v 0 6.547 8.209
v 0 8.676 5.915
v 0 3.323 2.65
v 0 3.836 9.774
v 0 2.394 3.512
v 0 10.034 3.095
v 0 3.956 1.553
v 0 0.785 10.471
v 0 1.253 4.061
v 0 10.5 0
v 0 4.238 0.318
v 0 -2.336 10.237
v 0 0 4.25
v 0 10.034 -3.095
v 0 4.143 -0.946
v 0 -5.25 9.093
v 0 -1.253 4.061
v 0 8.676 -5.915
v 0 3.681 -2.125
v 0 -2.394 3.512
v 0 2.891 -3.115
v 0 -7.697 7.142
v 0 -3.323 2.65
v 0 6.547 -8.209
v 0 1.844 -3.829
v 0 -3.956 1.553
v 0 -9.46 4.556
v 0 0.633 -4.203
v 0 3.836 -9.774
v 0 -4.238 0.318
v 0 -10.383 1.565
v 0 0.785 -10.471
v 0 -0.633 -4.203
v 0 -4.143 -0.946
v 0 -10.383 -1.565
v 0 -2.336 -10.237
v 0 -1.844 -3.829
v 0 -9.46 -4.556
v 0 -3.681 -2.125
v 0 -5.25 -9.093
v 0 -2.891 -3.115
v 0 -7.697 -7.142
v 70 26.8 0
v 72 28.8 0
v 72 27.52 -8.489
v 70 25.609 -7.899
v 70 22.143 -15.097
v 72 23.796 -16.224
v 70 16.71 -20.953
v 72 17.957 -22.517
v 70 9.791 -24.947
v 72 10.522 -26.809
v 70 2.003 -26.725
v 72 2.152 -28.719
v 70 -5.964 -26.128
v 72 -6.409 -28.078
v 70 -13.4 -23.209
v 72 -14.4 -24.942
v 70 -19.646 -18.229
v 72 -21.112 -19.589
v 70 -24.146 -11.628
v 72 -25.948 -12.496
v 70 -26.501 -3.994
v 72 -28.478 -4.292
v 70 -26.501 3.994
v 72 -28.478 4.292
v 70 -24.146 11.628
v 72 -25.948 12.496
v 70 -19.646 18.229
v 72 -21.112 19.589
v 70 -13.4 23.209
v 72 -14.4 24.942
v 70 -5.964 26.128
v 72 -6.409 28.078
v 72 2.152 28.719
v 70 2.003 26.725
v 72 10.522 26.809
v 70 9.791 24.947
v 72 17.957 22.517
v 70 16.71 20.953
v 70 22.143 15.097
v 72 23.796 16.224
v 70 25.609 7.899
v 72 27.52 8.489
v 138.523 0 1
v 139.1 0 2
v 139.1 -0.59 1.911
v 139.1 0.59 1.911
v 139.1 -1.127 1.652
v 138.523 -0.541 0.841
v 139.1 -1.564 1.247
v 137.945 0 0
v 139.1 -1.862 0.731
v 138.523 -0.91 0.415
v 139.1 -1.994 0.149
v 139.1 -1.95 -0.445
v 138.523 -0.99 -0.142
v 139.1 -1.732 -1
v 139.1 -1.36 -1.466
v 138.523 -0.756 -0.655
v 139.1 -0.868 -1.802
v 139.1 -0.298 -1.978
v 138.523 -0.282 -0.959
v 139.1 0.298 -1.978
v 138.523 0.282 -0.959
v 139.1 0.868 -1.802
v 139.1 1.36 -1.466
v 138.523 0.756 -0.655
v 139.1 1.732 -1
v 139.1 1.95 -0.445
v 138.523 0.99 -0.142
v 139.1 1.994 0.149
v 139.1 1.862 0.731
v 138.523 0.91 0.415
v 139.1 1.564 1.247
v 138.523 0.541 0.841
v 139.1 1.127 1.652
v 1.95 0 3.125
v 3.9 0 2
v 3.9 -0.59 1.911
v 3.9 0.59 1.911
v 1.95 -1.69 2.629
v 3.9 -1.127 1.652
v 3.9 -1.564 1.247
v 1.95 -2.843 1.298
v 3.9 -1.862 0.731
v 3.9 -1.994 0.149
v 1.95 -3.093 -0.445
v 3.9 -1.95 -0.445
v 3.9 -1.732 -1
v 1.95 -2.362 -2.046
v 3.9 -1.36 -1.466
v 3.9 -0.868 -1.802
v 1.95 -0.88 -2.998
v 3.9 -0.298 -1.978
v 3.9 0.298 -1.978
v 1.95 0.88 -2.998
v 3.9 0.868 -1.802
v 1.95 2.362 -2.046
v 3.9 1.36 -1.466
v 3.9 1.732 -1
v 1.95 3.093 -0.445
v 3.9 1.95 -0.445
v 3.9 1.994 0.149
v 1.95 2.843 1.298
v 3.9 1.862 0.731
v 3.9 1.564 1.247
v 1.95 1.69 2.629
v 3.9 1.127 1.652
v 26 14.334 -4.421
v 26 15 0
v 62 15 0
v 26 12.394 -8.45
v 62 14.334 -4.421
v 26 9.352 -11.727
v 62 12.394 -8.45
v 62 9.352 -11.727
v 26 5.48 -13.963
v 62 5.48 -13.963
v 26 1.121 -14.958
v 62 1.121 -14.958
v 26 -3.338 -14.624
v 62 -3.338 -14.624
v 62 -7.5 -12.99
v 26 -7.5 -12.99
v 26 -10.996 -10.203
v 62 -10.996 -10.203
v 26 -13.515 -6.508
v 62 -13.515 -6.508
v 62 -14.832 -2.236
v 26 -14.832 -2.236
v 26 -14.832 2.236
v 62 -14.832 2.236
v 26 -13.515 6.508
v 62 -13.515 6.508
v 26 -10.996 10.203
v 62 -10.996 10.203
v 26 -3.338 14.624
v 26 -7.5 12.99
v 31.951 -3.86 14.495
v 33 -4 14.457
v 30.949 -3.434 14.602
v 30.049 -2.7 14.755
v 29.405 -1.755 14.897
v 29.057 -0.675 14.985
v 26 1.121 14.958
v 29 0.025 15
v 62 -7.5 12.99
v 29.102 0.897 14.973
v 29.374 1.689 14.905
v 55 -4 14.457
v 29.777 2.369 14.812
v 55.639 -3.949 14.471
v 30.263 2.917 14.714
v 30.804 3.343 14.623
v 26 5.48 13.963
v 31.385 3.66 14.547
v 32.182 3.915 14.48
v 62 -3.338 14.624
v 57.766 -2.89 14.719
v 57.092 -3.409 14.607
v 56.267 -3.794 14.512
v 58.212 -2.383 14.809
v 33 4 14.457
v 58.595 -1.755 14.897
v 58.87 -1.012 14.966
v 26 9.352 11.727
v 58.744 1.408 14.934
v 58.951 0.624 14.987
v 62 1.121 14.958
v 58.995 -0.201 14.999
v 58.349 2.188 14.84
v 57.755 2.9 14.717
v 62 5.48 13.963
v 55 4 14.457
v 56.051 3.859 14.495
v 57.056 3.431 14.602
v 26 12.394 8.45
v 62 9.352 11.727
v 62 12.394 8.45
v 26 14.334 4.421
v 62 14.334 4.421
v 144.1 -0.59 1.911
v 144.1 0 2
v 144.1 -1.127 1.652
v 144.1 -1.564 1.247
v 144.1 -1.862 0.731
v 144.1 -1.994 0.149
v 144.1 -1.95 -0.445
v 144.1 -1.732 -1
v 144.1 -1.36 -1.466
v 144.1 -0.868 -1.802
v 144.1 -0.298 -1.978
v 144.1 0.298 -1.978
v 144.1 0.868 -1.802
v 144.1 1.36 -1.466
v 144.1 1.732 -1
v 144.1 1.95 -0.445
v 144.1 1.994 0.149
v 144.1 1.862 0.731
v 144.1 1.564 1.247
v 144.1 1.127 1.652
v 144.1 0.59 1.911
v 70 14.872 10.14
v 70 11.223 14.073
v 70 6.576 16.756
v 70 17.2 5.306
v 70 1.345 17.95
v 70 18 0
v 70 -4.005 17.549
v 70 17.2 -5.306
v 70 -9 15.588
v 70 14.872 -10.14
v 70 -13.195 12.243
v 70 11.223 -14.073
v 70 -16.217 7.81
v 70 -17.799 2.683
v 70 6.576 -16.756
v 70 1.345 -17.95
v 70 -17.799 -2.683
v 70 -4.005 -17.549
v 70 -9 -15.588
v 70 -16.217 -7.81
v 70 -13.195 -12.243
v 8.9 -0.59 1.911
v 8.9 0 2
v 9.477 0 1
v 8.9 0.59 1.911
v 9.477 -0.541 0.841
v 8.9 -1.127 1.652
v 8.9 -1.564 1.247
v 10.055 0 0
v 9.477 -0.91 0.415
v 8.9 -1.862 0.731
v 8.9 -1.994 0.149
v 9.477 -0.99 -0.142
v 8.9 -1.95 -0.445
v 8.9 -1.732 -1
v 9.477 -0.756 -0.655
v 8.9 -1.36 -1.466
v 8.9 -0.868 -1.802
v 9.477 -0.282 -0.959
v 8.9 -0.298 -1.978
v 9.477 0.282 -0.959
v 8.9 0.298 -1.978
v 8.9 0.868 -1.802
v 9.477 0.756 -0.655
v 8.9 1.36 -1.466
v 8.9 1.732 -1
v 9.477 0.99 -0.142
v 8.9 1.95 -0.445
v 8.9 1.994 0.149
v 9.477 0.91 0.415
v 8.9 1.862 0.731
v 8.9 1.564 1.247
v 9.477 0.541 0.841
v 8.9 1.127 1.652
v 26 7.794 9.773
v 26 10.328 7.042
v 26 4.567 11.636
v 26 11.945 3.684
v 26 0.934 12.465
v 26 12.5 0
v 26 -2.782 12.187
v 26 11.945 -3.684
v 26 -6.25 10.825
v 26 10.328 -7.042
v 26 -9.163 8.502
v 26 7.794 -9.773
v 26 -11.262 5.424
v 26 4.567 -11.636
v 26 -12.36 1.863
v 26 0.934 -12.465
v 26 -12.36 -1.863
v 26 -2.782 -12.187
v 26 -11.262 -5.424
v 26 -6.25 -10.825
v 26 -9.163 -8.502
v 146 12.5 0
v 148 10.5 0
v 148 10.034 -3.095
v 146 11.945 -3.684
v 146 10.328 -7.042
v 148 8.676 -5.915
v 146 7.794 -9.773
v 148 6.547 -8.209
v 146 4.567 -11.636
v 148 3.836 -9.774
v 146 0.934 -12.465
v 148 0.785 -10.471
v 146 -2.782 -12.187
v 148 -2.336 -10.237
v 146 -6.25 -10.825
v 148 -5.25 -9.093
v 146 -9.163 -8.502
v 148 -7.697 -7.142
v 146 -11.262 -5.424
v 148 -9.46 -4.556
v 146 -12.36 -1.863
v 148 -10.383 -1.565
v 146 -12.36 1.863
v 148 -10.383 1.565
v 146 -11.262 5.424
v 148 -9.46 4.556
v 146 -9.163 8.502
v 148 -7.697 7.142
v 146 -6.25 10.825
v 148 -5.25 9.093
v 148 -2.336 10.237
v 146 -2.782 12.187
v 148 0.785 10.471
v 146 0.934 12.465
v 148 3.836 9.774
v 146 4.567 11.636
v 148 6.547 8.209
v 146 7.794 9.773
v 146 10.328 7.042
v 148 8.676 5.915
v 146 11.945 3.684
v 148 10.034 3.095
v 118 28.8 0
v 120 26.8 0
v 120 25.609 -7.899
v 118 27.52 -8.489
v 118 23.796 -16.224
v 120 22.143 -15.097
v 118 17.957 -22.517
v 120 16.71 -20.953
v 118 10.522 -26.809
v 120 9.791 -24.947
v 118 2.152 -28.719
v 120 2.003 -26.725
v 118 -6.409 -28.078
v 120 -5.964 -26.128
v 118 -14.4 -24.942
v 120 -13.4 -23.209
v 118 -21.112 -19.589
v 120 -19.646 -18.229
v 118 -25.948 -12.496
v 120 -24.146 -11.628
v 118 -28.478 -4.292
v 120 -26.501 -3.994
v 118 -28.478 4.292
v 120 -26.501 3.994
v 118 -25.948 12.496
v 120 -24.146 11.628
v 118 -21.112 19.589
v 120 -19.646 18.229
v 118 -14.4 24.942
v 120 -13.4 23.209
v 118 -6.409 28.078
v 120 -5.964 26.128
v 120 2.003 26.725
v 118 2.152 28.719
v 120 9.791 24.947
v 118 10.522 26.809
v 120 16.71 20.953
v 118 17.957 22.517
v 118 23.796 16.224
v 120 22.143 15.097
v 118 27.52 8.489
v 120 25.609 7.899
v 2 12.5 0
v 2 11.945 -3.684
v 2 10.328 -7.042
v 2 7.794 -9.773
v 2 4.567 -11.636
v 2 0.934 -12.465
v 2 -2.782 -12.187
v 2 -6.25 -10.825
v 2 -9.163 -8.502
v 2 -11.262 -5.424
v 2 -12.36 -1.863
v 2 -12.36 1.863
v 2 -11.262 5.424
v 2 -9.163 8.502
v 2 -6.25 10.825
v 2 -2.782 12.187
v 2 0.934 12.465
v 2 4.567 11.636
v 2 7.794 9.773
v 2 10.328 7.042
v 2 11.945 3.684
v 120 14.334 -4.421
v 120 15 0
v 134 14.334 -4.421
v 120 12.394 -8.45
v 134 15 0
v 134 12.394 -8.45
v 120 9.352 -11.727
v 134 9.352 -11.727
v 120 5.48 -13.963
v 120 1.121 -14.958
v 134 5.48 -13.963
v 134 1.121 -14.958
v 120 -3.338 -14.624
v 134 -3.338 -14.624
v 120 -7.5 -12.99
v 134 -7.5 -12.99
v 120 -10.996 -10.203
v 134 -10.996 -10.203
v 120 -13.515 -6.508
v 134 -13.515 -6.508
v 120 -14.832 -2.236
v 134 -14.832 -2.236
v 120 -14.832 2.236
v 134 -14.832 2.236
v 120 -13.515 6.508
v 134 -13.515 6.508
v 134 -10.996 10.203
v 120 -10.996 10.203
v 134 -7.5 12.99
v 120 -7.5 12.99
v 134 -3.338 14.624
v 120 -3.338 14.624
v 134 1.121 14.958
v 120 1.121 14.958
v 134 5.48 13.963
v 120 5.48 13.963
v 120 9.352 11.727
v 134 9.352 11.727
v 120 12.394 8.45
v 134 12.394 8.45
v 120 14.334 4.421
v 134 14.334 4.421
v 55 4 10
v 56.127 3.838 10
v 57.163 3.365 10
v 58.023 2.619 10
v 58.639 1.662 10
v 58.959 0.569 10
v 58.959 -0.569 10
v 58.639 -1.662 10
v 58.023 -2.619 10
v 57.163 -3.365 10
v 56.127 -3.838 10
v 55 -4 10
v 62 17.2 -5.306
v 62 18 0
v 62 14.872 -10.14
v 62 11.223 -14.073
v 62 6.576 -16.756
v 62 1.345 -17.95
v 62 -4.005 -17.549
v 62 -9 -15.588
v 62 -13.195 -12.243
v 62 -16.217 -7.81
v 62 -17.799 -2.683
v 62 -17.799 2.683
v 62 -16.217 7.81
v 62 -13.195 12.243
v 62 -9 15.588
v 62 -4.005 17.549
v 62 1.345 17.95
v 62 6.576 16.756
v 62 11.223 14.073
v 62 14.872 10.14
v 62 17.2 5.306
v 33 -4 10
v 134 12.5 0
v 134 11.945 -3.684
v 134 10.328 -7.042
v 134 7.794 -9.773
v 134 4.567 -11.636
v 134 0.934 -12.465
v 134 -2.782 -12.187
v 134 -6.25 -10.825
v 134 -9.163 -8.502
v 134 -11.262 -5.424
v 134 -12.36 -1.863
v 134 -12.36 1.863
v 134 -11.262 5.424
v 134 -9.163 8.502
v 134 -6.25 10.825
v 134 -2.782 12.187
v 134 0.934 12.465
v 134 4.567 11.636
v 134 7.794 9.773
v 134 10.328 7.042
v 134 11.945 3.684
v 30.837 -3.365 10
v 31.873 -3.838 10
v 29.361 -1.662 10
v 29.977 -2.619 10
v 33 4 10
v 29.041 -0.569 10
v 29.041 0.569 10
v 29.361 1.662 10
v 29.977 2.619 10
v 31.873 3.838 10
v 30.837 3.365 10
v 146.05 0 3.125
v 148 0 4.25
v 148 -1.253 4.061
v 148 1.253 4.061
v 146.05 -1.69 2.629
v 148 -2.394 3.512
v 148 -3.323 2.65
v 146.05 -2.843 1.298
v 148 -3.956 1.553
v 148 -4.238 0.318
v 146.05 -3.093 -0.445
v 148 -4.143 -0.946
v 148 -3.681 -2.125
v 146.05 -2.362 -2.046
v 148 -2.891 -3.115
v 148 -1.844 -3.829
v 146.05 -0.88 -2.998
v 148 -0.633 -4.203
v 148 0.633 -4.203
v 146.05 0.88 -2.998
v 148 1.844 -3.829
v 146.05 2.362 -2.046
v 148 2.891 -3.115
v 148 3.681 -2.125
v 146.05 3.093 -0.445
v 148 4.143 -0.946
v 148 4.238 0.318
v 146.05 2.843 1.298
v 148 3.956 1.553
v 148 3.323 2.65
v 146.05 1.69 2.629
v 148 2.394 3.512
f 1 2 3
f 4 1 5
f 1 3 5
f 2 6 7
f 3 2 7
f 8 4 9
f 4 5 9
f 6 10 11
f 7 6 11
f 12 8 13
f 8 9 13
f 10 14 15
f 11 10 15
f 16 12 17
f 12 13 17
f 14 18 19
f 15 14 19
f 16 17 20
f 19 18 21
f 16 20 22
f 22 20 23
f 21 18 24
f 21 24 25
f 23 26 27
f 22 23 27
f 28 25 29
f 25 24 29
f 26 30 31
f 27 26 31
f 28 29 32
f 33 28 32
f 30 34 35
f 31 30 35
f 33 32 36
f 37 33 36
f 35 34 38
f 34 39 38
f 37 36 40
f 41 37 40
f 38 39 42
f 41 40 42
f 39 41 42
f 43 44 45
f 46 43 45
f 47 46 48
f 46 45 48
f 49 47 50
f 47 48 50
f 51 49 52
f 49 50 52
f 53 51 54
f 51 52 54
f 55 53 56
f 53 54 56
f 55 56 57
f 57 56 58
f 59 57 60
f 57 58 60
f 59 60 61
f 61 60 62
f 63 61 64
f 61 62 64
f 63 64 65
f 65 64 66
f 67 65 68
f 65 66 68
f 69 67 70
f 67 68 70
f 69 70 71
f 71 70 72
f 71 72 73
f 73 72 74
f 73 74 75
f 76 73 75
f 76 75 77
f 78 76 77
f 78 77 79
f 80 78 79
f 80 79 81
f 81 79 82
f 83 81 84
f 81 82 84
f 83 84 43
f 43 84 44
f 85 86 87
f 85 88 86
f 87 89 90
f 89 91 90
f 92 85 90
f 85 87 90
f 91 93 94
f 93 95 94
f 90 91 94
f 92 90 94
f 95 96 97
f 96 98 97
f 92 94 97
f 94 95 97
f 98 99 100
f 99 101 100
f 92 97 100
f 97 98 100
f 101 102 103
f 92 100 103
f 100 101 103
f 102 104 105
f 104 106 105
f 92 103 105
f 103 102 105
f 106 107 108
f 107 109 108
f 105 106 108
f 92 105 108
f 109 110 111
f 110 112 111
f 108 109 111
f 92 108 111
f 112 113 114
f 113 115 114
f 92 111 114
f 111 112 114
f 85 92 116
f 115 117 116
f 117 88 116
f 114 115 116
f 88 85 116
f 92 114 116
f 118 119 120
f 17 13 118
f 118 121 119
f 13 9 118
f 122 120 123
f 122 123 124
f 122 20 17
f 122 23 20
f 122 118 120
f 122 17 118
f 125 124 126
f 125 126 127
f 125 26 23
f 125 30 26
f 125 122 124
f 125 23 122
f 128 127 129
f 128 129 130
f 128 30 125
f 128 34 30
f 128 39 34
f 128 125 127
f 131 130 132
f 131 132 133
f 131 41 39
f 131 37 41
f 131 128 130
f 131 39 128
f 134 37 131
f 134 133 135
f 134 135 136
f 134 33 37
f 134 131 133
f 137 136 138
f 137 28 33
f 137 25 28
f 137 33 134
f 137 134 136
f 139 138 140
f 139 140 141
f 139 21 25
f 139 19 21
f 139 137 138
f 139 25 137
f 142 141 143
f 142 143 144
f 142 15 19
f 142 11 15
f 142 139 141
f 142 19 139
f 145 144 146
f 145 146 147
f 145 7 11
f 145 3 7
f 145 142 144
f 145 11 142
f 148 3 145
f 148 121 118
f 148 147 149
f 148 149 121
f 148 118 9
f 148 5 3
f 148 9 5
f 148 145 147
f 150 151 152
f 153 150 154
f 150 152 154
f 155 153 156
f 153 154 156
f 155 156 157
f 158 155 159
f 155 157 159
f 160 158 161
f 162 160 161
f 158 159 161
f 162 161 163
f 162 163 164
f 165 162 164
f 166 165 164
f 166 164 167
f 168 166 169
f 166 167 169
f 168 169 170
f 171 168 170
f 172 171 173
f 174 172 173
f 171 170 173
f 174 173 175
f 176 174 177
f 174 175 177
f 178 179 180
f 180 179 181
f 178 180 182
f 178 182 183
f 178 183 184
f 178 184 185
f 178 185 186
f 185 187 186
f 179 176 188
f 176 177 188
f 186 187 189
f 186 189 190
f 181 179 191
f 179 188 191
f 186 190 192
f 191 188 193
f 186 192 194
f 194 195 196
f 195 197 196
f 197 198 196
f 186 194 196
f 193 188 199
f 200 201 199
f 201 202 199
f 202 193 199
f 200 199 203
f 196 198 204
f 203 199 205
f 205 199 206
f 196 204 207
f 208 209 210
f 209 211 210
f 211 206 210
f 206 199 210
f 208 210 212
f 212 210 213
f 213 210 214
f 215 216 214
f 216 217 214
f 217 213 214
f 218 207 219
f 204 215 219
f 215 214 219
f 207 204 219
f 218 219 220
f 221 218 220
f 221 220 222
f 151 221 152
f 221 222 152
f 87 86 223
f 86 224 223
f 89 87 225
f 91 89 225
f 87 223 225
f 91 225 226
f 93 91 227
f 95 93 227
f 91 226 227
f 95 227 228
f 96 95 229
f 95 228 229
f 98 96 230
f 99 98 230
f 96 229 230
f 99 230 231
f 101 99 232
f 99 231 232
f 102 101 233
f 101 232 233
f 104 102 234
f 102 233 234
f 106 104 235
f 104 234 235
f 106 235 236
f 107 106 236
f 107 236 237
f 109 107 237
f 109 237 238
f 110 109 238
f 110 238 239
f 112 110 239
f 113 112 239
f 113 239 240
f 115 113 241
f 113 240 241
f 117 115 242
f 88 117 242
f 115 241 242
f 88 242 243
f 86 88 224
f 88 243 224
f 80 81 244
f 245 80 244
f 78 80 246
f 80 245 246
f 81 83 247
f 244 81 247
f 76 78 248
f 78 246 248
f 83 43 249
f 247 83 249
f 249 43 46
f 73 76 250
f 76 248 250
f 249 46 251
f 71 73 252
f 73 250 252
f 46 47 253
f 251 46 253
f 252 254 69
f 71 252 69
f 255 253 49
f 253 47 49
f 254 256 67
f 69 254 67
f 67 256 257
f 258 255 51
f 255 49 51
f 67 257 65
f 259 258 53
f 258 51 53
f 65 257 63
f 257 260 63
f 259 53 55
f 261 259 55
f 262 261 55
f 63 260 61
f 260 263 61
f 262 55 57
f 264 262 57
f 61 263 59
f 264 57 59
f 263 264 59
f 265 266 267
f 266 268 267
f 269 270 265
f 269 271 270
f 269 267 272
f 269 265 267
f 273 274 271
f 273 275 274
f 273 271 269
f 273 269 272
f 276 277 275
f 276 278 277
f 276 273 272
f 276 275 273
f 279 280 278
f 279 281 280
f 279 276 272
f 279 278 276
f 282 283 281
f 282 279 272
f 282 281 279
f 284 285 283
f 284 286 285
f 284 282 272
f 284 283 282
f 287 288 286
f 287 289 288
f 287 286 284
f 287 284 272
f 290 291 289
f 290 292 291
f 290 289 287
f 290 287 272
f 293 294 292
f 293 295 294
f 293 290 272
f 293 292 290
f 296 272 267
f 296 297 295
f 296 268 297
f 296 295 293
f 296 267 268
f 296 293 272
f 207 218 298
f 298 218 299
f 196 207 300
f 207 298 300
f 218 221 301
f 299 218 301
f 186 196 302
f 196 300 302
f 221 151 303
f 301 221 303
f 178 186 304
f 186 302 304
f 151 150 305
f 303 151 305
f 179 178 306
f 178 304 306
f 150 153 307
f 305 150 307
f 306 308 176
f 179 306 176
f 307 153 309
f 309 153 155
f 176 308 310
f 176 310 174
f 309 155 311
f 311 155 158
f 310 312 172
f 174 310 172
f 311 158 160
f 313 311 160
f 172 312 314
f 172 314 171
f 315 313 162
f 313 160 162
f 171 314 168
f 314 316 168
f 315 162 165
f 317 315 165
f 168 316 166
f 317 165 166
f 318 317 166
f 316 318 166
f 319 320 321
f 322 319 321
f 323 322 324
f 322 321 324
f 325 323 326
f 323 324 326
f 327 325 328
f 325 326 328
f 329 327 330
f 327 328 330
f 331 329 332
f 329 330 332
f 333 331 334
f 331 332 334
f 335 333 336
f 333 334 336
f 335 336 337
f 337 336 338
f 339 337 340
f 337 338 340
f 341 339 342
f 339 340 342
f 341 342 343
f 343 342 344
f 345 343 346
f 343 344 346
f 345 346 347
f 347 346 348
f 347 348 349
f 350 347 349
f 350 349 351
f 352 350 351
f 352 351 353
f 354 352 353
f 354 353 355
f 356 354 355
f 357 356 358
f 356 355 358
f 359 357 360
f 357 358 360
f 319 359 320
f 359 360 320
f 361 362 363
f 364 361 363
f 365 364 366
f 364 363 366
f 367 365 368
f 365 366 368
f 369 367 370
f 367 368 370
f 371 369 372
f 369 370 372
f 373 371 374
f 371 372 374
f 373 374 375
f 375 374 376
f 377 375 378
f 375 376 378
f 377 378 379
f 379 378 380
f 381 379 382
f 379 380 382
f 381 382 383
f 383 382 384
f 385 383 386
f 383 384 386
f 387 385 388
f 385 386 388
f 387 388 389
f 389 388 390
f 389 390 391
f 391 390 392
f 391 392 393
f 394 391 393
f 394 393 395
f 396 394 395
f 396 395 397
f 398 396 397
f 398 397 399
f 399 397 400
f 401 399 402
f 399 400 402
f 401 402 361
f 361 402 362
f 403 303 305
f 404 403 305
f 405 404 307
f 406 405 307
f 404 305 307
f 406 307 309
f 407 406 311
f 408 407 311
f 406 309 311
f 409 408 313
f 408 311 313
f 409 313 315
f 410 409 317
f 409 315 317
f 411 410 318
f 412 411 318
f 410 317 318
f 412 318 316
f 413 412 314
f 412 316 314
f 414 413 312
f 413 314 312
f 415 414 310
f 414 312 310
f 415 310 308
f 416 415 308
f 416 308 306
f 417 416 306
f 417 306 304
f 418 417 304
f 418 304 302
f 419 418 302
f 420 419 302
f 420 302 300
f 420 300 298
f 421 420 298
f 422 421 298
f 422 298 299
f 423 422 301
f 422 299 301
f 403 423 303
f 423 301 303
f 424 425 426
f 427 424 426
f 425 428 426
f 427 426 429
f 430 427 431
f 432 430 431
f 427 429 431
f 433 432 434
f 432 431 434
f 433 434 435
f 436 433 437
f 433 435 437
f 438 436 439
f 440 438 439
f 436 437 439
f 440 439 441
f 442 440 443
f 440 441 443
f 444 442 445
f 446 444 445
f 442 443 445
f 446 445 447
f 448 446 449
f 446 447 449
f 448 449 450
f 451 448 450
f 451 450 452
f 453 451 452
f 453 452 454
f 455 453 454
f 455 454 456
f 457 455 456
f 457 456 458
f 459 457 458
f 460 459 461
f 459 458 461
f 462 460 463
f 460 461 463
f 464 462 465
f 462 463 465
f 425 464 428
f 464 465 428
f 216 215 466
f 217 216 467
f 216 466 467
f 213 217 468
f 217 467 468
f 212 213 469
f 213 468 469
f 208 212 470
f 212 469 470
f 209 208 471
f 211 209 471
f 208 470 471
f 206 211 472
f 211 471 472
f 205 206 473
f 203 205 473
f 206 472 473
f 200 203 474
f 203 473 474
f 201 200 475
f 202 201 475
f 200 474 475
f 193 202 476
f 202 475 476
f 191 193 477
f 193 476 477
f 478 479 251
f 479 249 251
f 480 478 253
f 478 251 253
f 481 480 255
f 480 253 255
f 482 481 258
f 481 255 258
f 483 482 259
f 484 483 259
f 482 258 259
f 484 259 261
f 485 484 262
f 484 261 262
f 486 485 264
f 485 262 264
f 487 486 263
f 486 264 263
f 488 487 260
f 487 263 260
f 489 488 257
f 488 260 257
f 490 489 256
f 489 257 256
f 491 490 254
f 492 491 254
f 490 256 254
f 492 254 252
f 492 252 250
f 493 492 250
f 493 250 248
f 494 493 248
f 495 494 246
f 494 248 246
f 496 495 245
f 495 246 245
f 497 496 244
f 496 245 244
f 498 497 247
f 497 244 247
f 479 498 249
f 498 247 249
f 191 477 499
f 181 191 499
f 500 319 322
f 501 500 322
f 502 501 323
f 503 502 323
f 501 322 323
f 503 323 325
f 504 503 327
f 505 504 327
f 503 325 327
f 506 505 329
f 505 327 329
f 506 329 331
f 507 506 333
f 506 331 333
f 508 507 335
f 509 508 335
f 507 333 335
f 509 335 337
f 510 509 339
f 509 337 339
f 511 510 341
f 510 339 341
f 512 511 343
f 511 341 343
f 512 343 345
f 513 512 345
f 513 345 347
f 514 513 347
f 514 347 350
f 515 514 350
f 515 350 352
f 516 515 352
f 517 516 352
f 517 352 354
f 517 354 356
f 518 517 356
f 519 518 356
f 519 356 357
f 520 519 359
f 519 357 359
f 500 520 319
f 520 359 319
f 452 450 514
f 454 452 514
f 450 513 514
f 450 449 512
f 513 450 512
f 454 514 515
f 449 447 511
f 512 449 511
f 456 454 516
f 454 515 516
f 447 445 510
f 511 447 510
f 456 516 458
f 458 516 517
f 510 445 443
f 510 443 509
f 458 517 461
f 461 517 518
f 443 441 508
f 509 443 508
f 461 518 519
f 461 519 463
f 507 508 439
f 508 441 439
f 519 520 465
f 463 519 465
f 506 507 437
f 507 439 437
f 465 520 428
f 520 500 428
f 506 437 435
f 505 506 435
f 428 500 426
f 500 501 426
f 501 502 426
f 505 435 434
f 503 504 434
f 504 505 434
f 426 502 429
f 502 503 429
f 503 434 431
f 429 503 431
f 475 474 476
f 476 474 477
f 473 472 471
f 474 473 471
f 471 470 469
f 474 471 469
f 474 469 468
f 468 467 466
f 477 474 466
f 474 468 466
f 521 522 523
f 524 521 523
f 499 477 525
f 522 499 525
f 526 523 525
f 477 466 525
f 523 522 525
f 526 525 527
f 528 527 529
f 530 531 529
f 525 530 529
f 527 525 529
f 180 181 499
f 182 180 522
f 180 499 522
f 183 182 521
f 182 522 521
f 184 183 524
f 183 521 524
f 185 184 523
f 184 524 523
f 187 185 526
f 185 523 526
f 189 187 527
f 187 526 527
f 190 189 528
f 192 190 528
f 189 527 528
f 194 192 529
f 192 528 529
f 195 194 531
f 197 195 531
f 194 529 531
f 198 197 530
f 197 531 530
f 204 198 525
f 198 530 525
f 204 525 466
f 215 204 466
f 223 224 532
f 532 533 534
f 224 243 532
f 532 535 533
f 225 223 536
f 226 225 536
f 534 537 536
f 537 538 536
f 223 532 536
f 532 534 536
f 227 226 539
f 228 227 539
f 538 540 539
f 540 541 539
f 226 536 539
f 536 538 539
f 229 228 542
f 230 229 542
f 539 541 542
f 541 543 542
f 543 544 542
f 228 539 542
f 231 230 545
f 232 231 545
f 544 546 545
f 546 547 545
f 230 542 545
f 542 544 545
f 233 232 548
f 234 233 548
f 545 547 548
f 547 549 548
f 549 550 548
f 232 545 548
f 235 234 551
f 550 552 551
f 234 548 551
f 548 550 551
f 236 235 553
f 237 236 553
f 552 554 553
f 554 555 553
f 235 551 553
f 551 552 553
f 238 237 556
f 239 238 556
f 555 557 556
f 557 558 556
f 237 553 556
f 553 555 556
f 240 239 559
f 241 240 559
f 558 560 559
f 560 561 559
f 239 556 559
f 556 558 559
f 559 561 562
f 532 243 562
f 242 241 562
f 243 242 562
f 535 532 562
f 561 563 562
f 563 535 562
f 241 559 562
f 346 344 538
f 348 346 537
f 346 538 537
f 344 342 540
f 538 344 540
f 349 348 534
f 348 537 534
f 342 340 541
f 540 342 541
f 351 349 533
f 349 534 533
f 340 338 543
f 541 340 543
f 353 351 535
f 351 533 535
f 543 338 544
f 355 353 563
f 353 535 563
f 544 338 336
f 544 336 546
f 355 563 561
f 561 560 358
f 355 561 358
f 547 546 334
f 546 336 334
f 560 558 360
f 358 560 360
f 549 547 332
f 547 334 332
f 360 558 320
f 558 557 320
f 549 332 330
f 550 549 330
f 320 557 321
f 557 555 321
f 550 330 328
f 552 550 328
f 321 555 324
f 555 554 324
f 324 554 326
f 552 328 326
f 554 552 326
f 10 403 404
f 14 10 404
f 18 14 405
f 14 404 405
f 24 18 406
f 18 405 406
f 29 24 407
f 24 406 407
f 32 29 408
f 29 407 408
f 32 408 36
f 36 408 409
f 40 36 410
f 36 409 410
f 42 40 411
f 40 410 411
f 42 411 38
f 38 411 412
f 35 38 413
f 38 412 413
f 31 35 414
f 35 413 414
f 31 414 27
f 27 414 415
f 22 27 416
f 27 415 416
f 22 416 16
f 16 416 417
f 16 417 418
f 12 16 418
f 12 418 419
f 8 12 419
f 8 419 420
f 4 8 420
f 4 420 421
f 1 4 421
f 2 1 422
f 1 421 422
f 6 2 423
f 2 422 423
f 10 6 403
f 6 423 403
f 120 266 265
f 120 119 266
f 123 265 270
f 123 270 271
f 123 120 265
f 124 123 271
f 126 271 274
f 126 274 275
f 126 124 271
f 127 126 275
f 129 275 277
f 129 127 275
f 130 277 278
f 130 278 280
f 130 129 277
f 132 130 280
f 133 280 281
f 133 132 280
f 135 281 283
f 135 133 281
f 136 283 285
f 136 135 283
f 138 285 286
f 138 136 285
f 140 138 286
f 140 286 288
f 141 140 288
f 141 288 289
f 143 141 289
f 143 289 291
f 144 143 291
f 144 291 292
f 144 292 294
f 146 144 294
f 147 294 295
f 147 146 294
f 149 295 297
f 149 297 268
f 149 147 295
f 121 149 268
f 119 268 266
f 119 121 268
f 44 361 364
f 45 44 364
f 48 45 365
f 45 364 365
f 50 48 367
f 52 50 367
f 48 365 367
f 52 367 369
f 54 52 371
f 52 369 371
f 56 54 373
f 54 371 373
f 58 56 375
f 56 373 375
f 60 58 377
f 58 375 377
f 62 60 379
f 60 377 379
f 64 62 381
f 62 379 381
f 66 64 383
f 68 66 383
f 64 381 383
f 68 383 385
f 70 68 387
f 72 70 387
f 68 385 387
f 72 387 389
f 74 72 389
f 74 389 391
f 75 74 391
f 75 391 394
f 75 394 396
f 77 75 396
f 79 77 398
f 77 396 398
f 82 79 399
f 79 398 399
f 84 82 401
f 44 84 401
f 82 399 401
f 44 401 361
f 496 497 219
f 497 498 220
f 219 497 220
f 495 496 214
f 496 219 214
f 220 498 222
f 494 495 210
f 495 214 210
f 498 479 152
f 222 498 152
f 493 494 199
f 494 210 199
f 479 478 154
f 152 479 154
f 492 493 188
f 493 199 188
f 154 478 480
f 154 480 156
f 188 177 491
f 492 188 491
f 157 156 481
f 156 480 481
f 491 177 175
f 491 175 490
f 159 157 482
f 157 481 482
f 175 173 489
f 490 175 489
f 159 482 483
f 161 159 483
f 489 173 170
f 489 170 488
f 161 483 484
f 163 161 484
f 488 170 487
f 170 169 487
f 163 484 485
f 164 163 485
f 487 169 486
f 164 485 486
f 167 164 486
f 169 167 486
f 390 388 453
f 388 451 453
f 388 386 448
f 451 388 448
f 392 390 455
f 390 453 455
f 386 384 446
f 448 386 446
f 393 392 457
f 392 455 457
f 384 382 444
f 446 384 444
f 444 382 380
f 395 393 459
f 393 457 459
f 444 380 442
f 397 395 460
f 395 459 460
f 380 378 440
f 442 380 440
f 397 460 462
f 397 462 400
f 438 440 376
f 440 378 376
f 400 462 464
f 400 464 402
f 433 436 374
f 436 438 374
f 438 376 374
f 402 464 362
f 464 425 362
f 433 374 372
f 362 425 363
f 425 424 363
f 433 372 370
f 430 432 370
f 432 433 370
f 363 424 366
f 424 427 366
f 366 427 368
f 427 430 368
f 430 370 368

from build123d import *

# Parameters (mm, degrees)
CUT_EXTRUDE_START   = 10
CUT_EXTRUDE_2_DEPTH = 144.502052104
CHAMFER_1_SIZE      = 2
CHAMFER_2_SIZE      = 2


with BuildPart() as part:
    # Эскиз1 → Повернуть1 (revolve)
    with BuildSketch(Plane.XY, mode=Mode.PRIVATE) as revolve_1_sk:
        Polygon((0, 0), (0, -12.5), (26, -12.5), (26, -15), (62, -15), (62, -18), (70, -18), (70, -28.8), (120, -28.8), (120, -15), (134, -15), (134, -12.5), (148, -12.5), (148, 0), align=None)
    revolve(revolve_1_sk.sketch.rotate(Axis((148, 0, 0), (-1, 0, 0)), 180), axis=Axis((148, 0, 0), (-1, 0, 0)))

    # Эскиз3 → Вырез-Повернуть1 (revolve, cut)
    with BuildSketch(Plane.XY, mode=Mode.PRIVATE) as cut_revolve_1_sk:
        Polygon((0, 0), (10.054700538, 0), (8.9, 2), (3.9, 2), (0, 4.25), align=None)
    cut_revolve_1 = revolve(cut_revolve_1_sk.sketch.rotate(Axis((0, 0, 0), (1, 0, 0)), 90), axis=Axis((0, 0, 0), (1, 0, 0)), mode=Mode.SUBTRACT)

    # Зеркальное отражение1: Вырез-Повернуть1 across plane
    add(cut_revolve_1.mirror(Plane.ZY.offset(-74)), mode=Mode.SUBTRACT)

    # Эскиз4 → Вырез-Вытянуть2 (cut, through all)
    with BuildSketch(Plane.XY.offset(CUT_EXTRUDE_START)):
        with BuildLine():
            Line((33, 4), (55, 4))
            ThreePointArc((55, 4), (59, 0), (55, -4))
            Line((55, -4), (33, -4))
            ThreePointArc((33, -4), (29, 0), (33, 4))
        make_face()
    extrude(amount=CUT_EXTRUDE_2_DEPTH, mode=Mode.SUBTRACT)

    # Фаска1
    chamfer_1_edges = [part.edges().sort_by_distance(p)[0] for p in [
        (0, -12.5, 0),
    ]]
    chamfer(chamfer_1_edges, length=CHAMFER_1_SIZE)

    # Фаска2
    chamfer_2_edges = [part.edges().sort_by_distance(p)[0] for p in [
        (148, -12.5, 0),
        (120, -28.8, 0),
        (70, -28.8, 0),
    ]]
    chamfer(chamfer_2_edges, length=CHAMFER_2_SIZE)


solid = part.part
